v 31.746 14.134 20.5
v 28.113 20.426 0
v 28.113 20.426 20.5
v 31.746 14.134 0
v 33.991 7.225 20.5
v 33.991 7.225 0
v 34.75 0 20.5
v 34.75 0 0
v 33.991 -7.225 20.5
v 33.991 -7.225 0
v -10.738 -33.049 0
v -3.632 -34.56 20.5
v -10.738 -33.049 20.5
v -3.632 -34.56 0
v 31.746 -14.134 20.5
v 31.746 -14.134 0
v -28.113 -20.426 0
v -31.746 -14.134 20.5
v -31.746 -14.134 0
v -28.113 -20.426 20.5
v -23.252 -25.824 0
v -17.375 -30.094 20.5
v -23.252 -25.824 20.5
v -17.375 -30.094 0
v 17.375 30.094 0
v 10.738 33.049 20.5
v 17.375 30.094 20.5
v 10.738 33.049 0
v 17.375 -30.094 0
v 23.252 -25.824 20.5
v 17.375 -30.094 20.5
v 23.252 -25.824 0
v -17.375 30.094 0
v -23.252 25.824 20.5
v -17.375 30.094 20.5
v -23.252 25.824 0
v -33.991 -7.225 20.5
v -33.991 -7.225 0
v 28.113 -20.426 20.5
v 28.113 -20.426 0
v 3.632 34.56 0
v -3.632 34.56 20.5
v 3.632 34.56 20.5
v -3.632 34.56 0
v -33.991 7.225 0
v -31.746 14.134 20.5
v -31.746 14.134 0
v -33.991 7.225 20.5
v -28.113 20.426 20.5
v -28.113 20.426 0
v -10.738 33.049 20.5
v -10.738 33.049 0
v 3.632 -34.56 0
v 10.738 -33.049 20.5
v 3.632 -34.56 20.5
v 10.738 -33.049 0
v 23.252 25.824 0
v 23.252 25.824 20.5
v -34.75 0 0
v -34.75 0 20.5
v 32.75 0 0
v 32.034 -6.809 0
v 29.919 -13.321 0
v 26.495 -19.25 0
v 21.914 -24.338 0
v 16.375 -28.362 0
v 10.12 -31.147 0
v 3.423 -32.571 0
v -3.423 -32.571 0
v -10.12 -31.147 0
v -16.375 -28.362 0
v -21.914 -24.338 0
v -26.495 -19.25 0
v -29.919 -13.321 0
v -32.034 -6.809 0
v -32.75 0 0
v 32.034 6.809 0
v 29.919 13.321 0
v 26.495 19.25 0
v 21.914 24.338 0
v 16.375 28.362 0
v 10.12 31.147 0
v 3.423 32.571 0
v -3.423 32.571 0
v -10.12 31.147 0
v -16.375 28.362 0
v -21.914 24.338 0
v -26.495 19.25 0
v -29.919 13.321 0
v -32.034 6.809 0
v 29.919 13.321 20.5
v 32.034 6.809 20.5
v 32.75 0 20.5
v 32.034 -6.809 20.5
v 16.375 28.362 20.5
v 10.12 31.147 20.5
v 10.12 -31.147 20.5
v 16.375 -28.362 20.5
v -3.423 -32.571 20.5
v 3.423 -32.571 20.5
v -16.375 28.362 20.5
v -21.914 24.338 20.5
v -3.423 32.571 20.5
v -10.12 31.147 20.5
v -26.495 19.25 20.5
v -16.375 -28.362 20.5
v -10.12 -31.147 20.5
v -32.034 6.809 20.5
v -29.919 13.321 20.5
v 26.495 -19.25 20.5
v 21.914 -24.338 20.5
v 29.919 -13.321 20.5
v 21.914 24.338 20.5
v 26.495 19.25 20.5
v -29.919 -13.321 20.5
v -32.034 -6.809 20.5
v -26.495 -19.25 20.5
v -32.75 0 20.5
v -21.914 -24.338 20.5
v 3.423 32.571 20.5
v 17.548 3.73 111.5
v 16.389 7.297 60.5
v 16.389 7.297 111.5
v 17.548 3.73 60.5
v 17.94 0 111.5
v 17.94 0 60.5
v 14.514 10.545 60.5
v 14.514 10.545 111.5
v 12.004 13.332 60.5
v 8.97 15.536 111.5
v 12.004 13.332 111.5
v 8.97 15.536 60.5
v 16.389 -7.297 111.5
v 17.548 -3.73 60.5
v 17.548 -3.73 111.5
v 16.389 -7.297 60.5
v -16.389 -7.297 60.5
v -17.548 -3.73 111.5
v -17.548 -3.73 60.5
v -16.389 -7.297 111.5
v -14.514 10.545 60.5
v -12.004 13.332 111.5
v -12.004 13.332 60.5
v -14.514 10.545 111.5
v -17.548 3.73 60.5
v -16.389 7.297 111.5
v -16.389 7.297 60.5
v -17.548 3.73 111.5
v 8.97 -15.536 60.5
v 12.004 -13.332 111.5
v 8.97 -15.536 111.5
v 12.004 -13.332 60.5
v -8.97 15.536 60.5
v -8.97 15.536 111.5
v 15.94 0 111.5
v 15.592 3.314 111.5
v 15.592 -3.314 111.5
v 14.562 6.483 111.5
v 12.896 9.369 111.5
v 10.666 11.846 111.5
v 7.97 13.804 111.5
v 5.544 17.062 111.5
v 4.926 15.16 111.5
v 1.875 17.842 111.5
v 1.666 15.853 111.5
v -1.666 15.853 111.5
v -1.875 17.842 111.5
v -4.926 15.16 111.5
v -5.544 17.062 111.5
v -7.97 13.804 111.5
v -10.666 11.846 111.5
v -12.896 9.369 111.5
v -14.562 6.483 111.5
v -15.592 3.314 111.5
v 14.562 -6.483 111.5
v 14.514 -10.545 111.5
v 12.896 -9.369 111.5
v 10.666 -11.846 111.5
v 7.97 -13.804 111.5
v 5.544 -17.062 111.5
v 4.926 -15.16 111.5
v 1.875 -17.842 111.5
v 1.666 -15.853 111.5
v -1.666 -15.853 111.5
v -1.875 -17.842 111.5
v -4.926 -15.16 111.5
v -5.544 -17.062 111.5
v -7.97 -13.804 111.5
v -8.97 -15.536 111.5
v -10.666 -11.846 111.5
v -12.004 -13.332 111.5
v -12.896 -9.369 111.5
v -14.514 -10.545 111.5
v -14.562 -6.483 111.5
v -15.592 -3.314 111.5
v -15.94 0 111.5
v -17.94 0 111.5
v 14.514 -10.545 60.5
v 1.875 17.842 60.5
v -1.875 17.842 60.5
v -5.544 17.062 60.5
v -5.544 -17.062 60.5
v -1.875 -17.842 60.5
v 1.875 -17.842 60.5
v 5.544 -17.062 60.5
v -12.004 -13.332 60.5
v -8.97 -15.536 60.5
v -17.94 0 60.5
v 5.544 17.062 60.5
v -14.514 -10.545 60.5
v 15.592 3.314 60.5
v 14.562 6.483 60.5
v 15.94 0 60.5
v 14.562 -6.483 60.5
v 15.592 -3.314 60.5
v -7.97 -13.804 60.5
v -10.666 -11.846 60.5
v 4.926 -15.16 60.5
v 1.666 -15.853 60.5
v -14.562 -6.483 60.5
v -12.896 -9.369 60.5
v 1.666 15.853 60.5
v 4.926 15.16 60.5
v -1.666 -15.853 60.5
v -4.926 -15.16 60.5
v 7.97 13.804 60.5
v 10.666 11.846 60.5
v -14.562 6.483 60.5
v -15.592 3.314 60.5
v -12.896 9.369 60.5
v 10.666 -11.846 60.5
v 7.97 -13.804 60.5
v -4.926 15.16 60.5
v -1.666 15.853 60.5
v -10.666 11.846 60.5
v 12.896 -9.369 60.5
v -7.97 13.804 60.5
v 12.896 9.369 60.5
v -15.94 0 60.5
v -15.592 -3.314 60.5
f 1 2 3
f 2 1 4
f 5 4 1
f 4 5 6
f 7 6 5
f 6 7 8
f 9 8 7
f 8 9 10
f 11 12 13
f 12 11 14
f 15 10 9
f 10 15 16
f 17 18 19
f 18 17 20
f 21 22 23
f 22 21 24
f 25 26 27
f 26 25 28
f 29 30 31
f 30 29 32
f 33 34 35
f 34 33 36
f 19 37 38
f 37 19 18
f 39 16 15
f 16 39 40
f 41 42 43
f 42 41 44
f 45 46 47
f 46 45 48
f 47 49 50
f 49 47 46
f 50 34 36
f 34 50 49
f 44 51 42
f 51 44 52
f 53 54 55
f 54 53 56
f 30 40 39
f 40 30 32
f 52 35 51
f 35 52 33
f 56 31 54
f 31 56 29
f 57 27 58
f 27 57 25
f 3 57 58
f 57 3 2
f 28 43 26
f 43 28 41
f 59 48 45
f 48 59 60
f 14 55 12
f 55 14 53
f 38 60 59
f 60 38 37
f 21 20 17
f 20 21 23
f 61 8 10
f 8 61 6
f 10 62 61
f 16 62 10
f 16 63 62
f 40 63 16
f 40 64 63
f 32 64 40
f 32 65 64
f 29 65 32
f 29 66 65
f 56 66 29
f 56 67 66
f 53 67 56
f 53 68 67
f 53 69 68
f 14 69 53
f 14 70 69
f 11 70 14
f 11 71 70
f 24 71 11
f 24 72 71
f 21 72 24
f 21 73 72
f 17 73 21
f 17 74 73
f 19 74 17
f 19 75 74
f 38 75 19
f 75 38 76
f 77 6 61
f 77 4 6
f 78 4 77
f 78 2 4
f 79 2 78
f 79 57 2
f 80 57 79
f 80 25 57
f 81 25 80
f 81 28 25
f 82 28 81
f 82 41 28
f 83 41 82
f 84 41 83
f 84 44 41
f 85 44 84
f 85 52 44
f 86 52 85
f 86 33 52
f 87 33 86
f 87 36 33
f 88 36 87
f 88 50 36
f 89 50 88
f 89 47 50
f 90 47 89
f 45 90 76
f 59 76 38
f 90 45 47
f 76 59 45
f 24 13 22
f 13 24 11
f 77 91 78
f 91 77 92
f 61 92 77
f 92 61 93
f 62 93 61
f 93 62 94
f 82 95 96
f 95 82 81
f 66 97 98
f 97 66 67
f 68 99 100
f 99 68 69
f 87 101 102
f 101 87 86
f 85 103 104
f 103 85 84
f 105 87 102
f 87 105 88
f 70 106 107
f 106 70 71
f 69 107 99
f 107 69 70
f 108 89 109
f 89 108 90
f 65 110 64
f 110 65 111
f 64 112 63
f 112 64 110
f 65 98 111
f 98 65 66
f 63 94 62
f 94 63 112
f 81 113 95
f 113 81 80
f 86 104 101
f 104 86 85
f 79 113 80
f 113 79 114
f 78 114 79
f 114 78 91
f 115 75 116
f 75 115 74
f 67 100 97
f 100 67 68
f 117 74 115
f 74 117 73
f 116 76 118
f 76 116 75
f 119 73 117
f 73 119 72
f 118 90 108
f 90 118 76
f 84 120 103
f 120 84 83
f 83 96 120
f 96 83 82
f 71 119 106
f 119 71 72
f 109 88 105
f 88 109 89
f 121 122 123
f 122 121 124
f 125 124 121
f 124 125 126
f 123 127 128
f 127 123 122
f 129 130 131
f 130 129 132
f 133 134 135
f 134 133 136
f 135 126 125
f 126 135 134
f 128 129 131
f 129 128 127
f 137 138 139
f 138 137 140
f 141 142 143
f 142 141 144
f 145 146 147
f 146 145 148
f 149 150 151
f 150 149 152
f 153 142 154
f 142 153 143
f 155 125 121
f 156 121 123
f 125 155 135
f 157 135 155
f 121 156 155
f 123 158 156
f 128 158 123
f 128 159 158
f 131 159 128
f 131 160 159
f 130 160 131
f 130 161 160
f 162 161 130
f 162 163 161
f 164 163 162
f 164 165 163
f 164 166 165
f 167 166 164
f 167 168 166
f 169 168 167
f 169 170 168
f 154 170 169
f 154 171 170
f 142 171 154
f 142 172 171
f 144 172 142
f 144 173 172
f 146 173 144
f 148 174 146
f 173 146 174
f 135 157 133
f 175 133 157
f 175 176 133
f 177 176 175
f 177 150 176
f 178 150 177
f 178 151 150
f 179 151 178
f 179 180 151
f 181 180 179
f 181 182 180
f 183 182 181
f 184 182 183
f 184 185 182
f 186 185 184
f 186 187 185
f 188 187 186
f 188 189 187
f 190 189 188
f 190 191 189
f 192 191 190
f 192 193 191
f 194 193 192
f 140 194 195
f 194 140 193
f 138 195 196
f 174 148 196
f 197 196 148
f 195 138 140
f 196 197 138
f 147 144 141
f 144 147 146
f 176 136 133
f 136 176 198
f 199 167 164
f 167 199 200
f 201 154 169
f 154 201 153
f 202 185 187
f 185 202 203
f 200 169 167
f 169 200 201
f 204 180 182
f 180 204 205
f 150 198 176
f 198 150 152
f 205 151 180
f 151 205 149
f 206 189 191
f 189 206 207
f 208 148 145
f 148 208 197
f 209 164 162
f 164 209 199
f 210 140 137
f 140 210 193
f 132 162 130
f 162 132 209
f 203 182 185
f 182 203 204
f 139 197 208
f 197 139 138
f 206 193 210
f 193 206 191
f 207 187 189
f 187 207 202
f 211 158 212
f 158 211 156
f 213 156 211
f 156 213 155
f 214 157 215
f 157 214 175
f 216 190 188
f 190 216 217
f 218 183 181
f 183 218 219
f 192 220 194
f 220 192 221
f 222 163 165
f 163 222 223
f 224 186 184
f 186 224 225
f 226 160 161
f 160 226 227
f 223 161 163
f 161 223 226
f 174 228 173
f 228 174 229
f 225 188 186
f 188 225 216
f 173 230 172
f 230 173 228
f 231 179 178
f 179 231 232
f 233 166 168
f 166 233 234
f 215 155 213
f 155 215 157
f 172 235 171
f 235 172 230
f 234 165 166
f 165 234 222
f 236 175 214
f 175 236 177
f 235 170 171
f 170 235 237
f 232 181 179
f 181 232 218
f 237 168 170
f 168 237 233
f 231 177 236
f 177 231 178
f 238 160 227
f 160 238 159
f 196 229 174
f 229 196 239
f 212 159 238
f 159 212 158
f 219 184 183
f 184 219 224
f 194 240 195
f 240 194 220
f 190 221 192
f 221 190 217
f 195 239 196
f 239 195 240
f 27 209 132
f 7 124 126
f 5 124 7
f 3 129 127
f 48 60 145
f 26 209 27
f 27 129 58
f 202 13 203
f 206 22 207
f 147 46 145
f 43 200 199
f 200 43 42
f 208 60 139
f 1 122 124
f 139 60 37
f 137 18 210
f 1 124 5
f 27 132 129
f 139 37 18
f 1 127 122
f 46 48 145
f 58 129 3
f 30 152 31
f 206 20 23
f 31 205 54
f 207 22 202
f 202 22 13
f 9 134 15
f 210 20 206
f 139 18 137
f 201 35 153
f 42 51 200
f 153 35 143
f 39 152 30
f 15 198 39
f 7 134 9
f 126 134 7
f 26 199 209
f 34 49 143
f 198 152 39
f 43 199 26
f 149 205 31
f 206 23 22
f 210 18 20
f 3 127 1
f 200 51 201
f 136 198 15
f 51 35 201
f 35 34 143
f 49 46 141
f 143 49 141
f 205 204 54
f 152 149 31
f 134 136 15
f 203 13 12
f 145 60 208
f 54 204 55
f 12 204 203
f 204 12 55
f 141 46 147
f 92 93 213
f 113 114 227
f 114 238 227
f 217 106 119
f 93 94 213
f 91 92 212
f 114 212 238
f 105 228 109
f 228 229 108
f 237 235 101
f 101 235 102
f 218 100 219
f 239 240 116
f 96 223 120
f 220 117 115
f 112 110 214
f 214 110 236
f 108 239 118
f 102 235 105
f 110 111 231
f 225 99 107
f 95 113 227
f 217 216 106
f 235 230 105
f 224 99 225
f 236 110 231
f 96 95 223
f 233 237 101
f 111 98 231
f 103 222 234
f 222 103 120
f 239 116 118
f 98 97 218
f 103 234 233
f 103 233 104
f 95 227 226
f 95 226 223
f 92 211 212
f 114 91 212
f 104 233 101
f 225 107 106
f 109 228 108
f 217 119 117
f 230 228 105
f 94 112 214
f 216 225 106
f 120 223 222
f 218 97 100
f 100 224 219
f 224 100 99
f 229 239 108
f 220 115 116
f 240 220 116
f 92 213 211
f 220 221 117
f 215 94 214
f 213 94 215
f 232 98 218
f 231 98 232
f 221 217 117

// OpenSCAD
/*  customDustPortAdapter OpenSCAD File
    Copyright (C) 2017 The Maker Garage

    This program is free software: you can redistribute it and/or modify
    it under the terms of the GNU General Public License as published by
    the Free Software Foundation, either version 3 of the License, or
    (at your option) any later version.

    This program is distributed in the hope that it will be useful,
    but WITHOUT ANY WARRANTY; without even the implied warranty of
    MERCHANTABILITY or FITNESS FOR A PARTICULAR PURPOSE.  See the
    GNU General Public License for more details.

    You should have received a copy of the GNU General Public License
    along with this program.  If not, see <http://www.gnu.org/licenses/>.
    
*/

/*
    This file generates an adapter that allows a miter saw dust port to be connected with a shop-vac.  It was specifically designed for the Ryobi 12” Sliding Compound Miter Saw with Laser TSS120L and the Shop-Vac 90M300.  It may work with other saws and shop-vacs.  The dimensions listed below can be modified for use with another miter saw/shop-vac combo.  Due to the variance in printer calibration and quality, some tweaking of the parameters and/or the print may be required to be able to print the item.
*/
/* [Known Sizes] */

// Pick from one of the known tools or select custom.
tool = 65.5; // [65.5:Dewalt DWE7491 Table Saw,37.75:Ryobi TSS120L Miter Saw,64:Wen 6502 Belt Disc Sander]

// Pick which size vacuum attachments your vacuum uses
vacuum = 31.88; // [31.88:1.25" Attachments,63.5:2.5" Attachments] 

/* [Custom] */

// Enter the custom tool diameter in mm (A value other than 0 will override a known tool)
custom_tool_diameter = 0;

// Depth of the tool end on the adapter in mm
tool_depth = 20.5;

// Enter the custom vacuum nozzle diameter in mm (A value other than 0 will overide known vacuum sizes)
custom_vacuum_diameter = 0;

// Depth of the vacuum nozzle in mm
vacuum_depth = 51;

// Length of the transition in mm
transitionLength = 40;

// Wall thickness in mm
wallThickness = 2;


/* [Hidden] */
tool_diameter = custom_tool_diameter == 0 ? tool : custom_tool_diameter;
vacuum_diameter = custom_vacuum_diameter == 0 ? vacuum : custom_vacuum_diameter;

union(){
    difference(){
        cylinder(h=tool_depth, d=(tool_diameter+(2*wallThickness)));
        cylinder(h=tool_depth, d=tool_diameter);
    }
    //Better!
    translate([0, 0, (tool_depth+transitionLength)])
    difference(){
        cylinder(h=vacuum_depth, d=(vacuum_diameter+(2*wallThickness)));
        cylinder(h=vacuum_depth, d=vacuum_diameter);
    }
    translate([0, 0, tool_depth])
    difference(){
        cylinder(h=transitionLength, d1=(tool_diameter+(2*wallThickness)), d2=(vacuum_diameter+(2*wallThickness)));
        cylinder(h=transitionLength, d1=tool_diameter, d2=vacuum_diameter);
    }
}
